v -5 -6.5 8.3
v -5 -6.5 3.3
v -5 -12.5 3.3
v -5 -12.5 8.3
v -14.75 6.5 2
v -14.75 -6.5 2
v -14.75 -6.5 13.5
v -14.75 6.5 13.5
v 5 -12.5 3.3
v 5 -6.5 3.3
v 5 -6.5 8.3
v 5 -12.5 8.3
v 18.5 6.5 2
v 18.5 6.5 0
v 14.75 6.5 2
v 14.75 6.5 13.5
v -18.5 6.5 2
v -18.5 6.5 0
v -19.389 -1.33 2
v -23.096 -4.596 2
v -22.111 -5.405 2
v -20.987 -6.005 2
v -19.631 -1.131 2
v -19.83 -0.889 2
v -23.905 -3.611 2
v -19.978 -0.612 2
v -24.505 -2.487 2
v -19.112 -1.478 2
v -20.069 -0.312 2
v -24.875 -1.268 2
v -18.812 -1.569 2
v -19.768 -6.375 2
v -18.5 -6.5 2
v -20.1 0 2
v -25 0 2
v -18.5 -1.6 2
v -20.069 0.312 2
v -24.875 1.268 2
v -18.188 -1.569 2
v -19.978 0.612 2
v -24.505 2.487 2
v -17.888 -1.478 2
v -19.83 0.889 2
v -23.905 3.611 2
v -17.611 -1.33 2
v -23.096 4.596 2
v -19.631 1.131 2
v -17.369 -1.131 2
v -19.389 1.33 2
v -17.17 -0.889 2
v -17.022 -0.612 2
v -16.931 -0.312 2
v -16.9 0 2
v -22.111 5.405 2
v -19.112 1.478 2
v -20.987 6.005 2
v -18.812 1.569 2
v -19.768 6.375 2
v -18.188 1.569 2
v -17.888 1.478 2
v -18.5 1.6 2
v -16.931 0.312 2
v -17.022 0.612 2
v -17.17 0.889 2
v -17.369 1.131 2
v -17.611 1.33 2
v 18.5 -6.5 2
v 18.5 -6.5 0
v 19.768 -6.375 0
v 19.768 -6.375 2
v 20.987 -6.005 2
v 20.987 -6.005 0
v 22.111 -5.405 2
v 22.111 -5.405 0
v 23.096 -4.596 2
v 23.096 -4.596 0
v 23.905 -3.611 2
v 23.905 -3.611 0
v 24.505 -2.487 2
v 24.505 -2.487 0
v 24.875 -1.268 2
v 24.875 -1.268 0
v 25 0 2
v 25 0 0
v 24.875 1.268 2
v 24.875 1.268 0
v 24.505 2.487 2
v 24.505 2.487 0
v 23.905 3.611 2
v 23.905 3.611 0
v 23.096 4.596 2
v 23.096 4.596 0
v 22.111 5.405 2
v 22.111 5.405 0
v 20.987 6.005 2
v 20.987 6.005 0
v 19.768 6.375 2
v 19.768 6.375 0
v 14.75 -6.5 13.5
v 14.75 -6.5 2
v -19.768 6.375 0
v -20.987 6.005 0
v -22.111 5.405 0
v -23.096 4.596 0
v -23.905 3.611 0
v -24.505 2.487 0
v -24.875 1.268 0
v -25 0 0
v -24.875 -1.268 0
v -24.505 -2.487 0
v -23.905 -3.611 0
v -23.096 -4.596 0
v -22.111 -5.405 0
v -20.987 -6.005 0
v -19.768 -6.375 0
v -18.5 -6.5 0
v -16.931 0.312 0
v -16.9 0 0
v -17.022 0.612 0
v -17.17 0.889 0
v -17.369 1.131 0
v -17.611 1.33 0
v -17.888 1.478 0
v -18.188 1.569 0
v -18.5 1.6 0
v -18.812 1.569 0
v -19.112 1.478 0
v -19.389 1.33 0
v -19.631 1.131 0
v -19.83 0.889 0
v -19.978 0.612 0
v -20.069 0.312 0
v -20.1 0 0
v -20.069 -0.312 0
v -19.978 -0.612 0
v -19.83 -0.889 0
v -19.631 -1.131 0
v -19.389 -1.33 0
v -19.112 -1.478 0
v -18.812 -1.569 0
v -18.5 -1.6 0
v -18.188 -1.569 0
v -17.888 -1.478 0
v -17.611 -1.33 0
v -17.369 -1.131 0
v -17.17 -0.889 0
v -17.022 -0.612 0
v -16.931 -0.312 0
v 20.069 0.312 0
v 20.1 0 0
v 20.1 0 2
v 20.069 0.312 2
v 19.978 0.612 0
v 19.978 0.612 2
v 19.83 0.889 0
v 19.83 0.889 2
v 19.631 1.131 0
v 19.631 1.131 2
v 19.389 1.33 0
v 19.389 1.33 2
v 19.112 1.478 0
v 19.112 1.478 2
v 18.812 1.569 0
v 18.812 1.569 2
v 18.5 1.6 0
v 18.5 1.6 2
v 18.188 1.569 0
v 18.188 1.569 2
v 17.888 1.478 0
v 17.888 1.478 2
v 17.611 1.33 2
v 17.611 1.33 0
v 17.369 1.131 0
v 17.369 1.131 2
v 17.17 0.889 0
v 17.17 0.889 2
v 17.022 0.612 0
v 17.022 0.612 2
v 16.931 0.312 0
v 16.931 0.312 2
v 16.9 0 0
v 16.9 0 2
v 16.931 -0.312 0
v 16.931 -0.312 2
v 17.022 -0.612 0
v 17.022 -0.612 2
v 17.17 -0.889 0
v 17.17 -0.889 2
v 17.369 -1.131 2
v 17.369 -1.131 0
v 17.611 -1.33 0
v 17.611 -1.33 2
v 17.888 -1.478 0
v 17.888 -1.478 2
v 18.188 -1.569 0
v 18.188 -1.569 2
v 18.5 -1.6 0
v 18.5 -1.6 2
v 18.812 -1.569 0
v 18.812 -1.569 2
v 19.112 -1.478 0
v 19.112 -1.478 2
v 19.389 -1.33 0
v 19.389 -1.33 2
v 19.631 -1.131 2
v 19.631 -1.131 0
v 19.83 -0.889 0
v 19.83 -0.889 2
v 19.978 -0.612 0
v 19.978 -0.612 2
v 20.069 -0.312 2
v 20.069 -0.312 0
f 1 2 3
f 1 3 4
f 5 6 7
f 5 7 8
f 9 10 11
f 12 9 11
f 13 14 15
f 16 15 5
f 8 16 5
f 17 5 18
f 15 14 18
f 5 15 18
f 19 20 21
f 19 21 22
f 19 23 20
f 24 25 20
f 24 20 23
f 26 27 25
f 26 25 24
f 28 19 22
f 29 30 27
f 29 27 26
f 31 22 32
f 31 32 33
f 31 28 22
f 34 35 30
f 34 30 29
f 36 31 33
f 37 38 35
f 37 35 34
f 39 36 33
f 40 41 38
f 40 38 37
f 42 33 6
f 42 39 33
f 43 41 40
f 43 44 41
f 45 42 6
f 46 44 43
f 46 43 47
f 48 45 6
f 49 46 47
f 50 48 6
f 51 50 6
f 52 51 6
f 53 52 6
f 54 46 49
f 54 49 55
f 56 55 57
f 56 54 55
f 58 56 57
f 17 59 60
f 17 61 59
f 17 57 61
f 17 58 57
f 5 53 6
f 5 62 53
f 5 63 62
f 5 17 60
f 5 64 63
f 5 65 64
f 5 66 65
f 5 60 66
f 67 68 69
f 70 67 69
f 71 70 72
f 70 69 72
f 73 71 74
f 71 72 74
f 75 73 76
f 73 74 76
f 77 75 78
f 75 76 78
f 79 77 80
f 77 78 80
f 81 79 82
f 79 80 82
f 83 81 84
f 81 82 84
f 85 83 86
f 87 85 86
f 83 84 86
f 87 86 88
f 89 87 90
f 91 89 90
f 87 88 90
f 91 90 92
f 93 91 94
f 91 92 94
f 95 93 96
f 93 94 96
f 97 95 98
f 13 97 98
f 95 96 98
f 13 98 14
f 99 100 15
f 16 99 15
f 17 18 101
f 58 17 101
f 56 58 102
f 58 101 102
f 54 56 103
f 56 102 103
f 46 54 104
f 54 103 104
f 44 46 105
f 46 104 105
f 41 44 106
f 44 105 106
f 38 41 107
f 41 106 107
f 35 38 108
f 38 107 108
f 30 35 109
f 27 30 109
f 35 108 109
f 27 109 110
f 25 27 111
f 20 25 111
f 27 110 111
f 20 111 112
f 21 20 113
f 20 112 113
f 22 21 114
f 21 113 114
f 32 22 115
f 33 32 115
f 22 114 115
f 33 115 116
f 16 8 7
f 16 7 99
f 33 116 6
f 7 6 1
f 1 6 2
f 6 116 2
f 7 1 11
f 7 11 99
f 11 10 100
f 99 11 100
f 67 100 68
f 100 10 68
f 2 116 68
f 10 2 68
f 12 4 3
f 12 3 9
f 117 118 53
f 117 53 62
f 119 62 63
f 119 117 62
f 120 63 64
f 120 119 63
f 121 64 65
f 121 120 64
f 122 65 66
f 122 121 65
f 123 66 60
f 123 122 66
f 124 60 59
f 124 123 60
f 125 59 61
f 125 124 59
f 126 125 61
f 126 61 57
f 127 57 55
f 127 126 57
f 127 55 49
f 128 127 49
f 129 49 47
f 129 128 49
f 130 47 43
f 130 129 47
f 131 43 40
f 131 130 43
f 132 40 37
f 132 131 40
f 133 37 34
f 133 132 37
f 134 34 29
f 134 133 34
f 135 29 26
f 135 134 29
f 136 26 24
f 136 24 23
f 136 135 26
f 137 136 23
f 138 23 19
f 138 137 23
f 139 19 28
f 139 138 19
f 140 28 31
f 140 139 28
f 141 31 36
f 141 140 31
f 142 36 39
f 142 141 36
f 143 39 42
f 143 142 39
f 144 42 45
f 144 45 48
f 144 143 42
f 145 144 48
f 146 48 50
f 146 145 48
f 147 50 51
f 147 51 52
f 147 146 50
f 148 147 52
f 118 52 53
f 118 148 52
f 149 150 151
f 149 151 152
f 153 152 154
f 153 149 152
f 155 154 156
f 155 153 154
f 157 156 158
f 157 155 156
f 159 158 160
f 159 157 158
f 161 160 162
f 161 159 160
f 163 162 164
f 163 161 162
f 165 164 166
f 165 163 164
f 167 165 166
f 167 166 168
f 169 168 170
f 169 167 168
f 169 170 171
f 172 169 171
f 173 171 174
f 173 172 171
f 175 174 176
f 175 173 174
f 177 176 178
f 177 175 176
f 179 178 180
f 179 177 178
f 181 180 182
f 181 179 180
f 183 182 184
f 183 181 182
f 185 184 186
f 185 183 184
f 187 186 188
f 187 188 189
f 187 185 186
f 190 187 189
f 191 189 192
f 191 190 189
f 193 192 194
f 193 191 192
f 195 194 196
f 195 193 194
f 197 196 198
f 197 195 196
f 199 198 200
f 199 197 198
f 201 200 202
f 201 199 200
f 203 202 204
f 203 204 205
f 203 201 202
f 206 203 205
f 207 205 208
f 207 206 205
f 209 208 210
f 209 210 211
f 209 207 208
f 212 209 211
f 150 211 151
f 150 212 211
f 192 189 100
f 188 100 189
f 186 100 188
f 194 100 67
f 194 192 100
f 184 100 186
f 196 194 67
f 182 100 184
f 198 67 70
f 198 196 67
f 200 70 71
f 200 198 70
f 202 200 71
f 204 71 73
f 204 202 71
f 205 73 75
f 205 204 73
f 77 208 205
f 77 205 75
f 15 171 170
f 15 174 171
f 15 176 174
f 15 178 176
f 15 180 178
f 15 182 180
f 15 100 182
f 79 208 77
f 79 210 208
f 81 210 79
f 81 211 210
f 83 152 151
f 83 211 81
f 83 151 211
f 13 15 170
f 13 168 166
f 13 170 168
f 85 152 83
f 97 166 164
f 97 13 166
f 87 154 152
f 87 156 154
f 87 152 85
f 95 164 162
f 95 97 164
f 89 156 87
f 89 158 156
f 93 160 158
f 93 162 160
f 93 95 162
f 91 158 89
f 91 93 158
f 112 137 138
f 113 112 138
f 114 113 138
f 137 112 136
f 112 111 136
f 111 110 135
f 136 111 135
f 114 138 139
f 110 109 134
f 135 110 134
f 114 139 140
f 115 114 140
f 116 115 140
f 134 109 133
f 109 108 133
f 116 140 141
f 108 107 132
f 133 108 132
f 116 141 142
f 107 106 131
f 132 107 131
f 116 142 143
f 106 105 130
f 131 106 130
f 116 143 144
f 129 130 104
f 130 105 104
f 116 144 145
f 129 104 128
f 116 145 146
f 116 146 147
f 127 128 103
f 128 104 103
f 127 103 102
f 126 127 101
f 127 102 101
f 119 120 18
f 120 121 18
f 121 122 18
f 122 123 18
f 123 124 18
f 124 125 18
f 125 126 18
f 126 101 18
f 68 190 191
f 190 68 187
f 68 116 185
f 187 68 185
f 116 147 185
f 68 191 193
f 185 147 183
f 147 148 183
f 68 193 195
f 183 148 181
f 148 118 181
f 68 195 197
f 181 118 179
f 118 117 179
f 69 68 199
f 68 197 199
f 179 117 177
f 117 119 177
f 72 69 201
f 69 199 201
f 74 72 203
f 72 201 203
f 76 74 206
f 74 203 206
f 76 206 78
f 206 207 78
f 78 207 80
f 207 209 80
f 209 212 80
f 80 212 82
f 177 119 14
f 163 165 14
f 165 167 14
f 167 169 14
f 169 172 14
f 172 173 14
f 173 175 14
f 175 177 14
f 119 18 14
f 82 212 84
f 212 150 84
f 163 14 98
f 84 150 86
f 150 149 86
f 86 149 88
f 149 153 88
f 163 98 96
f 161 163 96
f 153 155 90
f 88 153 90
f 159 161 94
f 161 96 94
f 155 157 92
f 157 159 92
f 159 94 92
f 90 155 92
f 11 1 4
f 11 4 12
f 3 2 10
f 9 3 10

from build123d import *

# Parameters (mm, degrees)
ESQUISSE1_R      = 1.6
EXTRUSION1_DEPTH = 2
ESQUISSE2_W      = 29.5
ESQUISSE2_H      = 13
EXTRUSION2_DEPTH = 11.5
ESQUISSE3_W      = 10
ESQUISSE3_H      = 5
EXTRUSION3_DEPTH = 6


with BuildPart() as part:
    # Esquisse1 → Extrusion1 (new body)
    with BuildSketch(Plane.XY):
        with BuildLine():
            Line((-18.5, -6.5), (18.5, -6.5))
            ThreePointArc((18.5, -6.5), (25, 0), (18.5, 6.5))
            Line((18.5, 6.5), (-18.5, 6.5))
            ThreePointArc((-18.5, 6.5), (-25, 0), (-18.5, -6.5))
        make_face()
        with Locations((-18.5, 0)):
            Circle(ESQUISSE1_R, mode=Mode.SUBTRACT)
        with Locations((18.5, 0)):
            Circle(ESQUISSE1_R, mode=Mode.SUBTRACT)
    extrude(amount=EXTRUSION1_DEPTH)

    # Esquisse2 → Extrusion2 (add)
    with BuildSketch(Plane.XY.offset(2)):
        Rectangle(ESQUISSE2_W, ESQUISSE2_H)
    extrude(amount=EXTRUSION2_DEPTH)

    # Esquisse3 → Extrusion3 (add)
    with BuildSketch(Plane.XZ.offset(6.5)):
        with Locations((0, 5.8)):
            Rectangle(ESQUISSE3_W, ESQUISSE3_H)
    extrude(amount=EXTRUSION3_DEPTH)


solid = part.part
